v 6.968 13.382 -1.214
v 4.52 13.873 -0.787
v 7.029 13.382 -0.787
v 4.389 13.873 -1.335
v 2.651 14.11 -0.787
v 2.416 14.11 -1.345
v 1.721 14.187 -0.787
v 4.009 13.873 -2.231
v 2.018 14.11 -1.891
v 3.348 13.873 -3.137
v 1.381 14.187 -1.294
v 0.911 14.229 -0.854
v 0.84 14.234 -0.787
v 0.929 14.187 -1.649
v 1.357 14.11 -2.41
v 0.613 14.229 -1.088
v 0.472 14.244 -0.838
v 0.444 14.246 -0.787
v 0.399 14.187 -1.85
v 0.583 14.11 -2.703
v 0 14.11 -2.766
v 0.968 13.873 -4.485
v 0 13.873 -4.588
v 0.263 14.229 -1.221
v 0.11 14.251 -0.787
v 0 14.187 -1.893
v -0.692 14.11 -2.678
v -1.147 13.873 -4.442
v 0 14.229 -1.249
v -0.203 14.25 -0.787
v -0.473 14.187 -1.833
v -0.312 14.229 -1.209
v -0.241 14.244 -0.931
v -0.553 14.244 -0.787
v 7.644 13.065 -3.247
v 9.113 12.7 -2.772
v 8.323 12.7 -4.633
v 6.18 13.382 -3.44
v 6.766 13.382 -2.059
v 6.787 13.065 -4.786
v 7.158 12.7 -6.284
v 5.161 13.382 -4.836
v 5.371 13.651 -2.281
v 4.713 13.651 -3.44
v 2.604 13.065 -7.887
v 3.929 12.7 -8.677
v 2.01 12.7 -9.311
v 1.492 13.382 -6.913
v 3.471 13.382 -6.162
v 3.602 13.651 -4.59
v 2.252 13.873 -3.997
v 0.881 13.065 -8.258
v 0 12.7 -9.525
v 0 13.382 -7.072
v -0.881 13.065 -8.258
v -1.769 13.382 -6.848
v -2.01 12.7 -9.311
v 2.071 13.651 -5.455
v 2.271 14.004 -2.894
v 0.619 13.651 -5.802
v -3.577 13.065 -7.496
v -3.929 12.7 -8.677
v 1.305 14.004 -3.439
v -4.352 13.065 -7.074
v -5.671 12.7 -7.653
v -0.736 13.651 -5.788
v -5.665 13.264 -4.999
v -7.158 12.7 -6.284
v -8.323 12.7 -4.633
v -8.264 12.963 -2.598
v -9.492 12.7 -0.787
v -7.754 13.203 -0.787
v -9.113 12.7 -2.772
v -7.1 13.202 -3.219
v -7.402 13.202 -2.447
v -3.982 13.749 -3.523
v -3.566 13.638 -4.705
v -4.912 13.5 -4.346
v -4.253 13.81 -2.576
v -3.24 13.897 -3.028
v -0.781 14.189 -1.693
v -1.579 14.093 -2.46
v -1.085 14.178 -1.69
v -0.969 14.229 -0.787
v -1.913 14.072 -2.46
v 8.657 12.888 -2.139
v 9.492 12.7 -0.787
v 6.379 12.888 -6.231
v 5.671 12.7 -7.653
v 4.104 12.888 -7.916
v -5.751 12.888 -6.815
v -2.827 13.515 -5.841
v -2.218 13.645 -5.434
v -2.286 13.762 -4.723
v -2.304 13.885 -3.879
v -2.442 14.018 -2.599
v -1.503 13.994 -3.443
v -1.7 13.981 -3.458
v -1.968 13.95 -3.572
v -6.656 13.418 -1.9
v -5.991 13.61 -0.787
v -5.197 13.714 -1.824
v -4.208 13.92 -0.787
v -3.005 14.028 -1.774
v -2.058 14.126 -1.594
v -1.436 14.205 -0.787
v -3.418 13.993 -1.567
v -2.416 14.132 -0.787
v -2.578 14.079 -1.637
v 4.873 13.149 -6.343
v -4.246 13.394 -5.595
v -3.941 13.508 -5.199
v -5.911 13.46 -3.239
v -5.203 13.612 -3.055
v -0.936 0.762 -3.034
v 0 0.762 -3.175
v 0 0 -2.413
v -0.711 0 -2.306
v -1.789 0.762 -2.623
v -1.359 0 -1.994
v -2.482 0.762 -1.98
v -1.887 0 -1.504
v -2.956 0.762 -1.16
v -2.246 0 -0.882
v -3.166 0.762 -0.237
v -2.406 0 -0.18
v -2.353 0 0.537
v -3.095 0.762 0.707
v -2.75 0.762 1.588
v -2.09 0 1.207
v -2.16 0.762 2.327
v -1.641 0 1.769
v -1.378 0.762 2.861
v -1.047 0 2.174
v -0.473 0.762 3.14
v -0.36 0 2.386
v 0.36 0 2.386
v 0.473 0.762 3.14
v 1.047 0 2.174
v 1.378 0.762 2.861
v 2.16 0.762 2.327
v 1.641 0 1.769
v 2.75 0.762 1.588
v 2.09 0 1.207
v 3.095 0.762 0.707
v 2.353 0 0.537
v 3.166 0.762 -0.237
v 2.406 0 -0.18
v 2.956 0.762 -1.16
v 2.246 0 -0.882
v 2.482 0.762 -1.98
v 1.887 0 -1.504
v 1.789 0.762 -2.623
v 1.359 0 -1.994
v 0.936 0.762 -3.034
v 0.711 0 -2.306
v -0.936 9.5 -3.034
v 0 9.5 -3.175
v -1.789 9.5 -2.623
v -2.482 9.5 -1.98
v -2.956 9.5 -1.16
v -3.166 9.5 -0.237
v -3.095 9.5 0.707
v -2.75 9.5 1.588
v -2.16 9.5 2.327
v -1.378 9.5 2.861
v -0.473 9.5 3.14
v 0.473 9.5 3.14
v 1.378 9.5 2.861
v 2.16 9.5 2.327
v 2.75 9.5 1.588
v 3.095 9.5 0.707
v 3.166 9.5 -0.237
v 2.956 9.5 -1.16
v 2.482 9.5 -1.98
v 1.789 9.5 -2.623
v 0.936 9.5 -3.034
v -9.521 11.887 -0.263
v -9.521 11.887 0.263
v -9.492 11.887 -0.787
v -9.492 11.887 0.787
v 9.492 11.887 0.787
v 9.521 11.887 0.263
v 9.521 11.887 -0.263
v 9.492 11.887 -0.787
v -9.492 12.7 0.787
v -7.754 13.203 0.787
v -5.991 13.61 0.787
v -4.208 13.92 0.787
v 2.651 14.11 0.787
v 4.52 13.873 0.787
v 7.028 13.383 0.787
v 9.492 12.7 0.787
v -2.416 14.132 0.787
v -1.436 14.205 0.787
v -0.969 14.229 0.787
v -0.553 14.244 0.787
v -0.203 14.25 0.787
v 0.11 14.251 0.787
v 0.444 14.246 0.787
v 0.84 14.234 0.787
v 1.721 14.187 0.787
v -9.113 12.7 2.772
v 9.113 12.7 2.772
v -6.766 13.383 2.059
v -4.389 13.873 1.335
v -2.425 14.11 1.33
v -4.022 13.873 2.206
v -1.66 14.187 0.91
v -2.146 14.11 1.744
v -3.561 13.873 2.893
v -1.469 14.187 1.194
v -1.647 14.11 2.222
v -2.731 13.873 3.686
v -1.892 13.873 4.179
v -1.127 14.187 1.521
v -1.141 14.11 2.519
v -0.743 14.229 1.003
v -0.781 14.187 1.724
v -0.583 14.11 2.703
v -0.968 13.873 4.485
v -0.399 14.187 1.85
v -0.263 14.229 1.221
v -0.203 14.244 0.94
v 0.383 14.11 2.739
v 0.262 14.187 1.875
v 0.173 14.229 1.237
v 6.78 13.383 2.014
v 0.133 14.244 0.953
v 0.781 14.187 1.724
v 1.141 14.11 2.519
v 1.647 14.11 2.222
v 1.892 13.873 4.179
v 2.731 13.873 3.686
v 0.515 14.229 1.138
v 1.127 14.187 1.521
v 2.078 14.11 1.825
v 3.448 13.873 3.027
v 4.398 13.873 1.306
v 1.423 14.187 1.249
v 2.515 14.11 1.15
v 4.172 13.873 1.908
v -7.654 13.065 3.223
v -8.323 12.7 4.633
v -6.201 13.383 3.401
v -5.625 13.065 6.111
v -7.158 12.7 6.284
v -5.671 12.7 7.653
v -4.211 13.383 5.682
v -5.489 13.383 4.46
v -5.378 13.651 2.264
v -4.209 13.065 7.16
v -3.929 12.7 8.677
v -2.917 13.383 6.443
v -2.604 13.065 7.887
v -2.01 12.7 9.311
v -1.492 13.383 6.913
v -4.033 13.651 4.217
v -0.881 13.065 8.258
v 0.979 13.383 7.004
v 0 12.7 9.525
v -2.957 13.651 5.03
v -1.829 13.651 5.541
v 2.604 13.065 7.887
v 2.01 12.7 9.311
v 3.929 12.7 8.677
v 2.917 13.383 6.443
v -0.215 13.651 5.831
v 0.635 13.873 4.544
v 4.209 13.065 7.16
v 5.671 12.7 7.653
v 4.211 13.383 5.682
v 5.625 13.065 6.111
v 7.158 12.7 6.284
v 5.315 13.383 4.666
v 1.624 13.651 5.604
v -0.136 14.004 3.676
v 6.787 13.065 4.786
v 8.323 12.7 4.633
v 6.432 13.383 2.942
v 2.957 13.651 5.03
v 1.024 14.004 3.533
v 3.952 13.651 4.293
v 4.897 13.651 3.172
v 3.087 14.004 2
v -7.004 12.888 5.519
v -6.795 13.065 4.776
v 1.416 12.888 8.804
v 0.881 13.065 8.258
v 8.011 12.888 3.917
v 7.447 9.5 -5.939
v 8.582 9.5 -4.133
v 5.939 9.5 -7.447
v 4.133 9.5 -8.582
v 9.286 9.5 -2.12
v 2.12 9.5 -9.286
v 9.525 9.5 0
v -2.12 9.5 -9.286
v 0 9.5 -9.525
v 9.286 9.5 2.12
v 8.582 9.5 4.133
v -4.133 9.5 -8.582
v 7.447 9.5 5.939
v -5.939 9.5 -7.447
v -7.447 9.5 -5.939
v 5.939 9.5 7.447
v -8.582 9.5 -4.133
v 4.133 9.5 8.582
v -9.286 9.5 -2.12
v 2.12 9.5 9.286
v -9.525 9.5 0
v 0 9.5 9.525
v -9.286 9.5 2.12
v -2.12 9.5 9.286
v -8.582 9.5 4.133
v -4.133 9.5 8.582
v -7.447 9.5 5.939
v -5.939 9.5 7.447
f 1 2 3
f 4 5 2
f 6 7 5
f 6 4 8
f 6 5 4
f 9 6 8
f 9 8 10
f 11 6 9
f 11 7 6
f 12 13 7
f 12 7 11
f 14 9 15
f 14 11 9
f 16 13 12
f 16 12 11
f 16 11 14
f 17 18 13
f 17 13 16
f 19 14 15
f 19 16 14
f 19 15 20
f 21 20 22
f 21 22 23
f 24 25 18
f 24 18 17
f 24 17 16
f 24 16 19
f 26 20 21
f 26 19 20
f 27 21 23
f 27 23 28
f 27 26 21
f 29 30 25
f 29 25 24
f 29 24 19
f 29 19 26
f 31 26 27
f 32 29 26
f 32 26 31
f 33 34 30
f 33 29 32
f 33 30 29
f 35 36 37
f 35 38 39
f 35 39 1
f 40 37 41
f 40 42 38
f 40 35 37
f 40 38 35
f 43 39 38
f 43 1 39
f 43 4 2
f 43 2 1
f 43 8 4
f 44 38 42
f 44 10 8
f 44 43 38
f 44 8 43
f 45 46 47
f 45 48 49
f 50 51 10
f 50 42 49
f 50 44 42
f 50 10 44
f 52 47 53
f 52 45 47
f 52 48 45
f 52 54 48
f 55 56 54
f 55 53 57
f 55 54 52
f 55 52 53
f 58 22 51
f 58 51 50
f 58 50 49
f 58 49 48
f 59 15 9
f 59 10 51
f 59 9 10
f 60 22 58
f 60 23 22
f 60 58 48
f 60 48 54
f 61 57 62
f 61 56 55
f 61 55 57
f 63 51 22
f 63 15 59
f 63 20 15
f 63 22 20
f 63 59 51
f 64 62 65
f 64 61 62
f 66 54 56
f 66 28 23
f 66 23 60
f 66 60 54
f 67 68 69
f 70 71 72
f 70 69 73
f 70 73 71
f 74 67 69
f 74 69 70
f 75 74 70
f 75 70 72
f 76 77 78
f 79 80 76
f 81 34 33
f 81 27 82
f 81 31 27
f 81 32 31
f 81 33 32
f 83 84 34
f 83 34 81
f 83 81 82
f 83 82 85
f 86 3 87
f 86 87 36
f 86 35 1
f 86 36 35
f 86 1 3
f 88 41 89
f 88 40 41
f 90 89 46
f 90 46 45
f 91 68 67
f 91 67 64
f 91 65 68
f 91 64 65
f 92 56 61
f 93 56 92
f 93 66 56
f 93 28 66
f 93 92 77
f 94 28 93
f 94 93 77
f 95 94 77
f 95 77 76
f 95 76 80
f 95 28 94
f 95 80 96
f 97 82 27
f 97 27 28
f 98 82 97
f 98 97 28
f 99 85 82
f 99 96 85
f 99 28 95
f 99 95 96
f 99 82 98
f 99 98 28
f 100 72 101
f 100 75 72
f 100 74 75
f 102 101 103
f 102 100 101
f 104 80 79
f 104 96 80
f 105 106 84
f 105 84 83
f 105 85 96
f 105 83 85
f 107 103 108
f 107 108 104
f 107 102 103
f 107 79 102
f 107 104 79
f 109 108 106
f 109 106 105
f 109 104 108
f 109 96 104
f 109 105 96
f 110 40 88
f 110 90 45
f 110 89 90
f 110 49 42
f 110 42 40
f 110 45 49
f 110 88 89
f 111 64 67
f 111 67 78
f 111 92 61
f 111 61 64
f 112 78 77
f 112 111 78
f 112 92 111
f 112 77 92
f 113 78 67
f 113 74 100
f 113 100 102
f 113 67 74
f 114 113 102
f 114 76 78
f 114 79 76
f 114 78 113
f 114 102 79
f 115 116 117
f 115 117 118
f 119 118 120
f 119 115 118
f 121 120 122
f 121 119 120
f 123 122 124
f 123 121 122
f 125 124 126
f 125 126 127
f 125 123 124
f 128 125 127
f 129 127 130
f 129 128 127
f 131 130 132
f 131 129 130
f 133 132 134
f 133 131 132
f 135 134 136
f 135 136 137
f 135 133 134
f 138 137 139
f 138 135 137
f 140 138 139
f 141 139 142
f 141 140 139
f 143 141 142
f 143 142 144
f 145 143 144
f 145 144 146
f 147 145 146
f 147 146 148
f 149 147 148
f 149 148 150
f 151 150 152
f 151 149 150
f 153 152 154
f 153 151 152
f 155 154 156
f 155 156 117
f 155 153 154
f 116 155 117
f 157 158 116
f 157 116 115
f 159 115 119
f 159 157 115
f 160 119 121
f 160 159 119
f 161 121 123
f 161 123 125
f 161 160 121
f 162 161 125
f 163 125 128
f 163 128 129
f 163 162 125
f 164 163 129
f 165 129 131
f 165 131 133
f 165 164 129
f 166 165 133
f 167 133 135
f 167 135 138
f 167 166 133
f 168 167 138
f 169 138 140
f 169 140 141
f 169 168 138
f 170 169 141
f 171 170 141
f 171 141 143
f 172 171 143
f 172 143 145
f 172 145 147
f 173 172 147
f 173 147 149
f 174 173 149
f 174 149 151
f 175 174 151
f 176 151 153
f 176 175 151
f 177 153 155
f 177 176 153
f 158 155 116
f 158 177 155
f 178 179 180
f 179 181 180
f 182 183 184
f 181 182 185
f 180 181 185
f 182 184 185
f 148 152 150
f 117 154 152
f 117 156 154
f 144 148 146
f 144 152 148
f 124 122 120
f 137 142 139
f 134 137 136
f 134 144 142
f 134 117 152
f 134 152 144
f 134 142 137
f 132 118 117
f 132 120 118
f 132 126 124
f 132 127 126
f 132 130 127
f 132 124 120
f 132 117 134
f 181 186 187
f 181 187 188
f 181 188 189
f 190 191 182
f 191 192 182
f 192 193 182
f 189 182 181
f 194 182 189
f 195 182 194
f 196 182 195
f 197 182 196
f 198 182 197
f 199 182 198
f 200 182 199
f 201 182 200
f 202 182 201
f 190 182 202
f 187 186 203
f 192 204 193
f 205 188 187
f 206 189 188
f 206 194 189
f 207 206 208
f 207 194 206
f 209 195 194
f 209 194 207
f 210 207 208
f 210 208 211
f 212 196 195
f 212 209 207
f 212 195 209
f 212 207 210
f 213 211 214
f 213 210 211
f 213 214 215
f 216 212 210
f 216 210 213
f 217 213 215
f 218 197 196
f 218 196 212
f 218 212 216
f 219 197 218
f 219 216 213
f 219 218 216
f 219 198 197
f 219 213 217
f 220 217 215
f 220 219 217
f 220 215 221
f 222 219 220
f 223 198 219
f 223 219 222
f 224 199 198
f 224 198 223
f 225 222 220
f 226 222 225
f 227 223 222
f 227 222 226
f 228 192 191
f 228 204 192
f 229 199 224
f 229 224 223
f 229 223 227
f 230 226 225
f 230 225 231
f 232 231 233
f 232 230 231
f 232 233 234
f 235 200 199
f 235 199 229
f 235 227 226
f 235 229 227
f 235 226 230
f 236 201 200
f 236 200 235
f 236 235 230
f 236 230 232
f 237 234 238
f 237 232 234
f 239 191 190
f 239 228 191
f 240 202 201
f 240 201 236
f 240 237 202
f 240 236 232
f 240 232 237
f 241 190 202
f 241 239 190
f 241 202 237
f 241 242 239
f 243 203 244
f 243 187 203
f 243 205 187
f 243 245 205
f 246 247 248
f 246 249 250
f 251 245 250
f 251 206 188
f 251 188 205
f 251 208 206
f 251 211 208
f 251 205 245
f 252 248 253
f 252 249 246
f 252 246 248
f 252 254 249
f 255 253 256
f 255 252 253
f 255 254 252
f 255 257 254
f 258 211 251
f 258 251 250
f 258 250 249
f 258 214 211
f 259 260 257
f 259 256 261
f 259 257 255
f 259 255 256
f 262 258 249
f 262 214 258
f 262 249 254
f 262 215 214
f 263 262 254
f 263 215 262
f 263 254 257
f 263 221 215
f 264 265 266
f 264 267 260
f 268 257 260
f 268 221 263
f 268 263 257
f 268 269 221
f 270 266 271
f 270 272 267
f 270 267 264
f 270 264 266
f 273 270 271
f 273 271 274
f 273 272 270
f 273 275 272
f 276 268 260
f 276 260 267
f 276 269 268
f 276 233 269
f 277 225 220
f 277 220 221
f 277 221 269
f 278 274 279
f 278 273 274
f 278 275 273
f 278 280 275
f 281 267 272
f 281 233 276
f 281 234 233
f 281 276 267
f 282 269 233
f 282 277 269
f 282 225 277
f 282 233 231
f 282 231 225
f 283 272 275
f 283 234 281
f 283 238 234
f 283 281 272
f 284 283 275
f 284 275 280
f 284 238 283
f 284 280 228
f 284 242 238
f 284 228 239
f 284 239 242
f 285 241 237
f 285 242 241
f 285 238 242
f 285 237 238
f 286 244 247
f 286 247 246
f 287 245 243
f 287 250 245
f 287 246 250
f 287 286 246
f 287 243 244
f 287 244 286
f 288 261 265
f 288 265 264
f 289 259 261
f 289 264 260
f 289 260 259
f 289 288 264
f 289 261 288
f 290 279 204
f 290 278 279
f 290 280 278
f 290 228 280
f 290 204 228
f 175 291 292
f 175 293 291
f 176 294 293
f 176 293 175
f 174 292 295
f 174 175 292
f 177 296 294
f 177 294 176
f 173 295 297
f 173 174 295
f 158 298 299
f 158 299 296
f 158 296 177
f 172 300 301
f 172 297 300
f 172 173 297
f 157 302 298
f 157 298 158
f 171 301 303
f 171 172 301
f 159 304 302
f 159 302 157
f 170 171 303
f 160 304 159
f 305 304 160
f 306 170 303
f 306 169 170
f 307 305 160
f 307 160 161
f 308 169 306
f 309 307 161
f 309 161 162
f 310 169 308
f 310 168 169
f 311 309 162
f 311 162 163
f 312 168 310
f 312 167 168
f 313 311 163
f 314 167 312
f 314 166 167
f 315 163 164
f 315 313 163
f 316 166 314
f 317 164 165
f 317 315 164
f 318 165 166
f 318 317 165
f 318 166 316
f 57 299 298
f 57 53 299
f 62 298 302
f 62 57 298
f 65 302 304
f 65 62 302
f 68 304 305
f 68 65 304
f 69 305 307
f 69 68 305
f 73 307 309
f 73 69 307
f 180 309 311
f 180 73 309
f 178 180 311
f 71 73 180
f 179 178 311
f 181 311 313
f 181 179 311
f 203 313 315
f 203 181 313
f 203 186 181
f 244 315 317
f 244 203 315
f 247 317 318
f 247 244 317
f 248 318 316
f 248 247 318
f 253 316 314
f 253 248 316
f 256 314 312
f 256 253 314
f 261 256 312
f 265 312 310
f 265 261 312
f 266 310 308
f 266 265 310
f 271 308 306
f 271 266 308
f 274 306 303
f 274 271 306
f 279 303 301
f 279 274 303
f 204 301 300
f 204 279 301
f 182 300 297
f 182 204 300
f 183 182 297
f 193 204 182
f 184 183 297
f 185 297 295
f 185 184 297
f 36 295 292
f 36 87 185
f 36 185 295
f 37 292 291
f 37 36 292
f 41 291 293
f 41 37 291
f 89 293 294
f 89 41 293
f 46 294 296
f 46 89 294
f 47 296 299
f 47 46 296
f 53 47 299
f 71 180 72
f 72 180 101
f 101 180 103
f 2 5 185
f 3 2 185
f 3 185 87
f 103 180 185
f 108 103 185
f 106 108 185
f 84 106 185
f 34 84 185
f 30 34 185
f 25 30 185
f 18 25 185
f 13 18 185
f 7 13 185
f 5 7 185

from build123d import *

# Parameters (mm, degrees)
CUT_EXTRUDE4_DEPTH      = 10.5250001
CUT_EXTRUDE4_DEPTH_BACK = 10.5250001
CHAMFER1_SIZE           = 0.762


with BuildPart() as part:
    # Sketch1 → Revolve1 (revolve)
    with BuildSketch(Plane(origin=(0, 0, 0), x_dir=(0, 0, -1), z_dir=(1, 0, 0))):
        with BuildLine():
            Line((0, 0), (3.175, 0))
            Line((3.175, 0), (3.175, 9.4996))
            Line((3.175, 9.4996), (9.525, 9.4996))
            Line((9.525, 9.4996), (9.525, 12.7))
            ThreePointArc((9.525, 12.7), (4.820045897, 13.835459863), (0, 14.2748))
            Line((0, 14.2748), (0, 0))
        make_face()
    revolve(axis=Axis((0, 0, 0), (0, 1, 0)))

    # Sketch2 → Cut-Extrude4 (cut, two sides)
    with BuildSketch(Plane(origin=(0, 0, 0), x_dir=(0, 0, -1), z_dir=(1, 0, 0))) as cut_extrude4_sk:
        Polygon((-0.7874, 59.433466129), (-0.7874, 14.251322907), (-0.7874, 11.8872), (0.7874, 11.8872), (0.7874, 14.251322907), (0.7874, 59.433466129), (0.7874, 149.797752573), (-0.7874, 149.797752573), align=None)
    extrude(amount=CUT_EXTRUDE4_DEPTH, mode=Mode.SUBTRACT)
    extrude(cut_extrude4_sk.sketch, amount=-CUT_EXTRUDE4_DEPTH_BACK, mode=Mode.SUBTRACT)

    # Chamfer1
    chamfer1_edges = [part.edges().sort_by_distance(p)[0] for p in [
        (0, 0, 3.175),
    ]]
    chamfer(chamfer1_edges, length=CHAMFER1_SIZE)


solid = part.part
